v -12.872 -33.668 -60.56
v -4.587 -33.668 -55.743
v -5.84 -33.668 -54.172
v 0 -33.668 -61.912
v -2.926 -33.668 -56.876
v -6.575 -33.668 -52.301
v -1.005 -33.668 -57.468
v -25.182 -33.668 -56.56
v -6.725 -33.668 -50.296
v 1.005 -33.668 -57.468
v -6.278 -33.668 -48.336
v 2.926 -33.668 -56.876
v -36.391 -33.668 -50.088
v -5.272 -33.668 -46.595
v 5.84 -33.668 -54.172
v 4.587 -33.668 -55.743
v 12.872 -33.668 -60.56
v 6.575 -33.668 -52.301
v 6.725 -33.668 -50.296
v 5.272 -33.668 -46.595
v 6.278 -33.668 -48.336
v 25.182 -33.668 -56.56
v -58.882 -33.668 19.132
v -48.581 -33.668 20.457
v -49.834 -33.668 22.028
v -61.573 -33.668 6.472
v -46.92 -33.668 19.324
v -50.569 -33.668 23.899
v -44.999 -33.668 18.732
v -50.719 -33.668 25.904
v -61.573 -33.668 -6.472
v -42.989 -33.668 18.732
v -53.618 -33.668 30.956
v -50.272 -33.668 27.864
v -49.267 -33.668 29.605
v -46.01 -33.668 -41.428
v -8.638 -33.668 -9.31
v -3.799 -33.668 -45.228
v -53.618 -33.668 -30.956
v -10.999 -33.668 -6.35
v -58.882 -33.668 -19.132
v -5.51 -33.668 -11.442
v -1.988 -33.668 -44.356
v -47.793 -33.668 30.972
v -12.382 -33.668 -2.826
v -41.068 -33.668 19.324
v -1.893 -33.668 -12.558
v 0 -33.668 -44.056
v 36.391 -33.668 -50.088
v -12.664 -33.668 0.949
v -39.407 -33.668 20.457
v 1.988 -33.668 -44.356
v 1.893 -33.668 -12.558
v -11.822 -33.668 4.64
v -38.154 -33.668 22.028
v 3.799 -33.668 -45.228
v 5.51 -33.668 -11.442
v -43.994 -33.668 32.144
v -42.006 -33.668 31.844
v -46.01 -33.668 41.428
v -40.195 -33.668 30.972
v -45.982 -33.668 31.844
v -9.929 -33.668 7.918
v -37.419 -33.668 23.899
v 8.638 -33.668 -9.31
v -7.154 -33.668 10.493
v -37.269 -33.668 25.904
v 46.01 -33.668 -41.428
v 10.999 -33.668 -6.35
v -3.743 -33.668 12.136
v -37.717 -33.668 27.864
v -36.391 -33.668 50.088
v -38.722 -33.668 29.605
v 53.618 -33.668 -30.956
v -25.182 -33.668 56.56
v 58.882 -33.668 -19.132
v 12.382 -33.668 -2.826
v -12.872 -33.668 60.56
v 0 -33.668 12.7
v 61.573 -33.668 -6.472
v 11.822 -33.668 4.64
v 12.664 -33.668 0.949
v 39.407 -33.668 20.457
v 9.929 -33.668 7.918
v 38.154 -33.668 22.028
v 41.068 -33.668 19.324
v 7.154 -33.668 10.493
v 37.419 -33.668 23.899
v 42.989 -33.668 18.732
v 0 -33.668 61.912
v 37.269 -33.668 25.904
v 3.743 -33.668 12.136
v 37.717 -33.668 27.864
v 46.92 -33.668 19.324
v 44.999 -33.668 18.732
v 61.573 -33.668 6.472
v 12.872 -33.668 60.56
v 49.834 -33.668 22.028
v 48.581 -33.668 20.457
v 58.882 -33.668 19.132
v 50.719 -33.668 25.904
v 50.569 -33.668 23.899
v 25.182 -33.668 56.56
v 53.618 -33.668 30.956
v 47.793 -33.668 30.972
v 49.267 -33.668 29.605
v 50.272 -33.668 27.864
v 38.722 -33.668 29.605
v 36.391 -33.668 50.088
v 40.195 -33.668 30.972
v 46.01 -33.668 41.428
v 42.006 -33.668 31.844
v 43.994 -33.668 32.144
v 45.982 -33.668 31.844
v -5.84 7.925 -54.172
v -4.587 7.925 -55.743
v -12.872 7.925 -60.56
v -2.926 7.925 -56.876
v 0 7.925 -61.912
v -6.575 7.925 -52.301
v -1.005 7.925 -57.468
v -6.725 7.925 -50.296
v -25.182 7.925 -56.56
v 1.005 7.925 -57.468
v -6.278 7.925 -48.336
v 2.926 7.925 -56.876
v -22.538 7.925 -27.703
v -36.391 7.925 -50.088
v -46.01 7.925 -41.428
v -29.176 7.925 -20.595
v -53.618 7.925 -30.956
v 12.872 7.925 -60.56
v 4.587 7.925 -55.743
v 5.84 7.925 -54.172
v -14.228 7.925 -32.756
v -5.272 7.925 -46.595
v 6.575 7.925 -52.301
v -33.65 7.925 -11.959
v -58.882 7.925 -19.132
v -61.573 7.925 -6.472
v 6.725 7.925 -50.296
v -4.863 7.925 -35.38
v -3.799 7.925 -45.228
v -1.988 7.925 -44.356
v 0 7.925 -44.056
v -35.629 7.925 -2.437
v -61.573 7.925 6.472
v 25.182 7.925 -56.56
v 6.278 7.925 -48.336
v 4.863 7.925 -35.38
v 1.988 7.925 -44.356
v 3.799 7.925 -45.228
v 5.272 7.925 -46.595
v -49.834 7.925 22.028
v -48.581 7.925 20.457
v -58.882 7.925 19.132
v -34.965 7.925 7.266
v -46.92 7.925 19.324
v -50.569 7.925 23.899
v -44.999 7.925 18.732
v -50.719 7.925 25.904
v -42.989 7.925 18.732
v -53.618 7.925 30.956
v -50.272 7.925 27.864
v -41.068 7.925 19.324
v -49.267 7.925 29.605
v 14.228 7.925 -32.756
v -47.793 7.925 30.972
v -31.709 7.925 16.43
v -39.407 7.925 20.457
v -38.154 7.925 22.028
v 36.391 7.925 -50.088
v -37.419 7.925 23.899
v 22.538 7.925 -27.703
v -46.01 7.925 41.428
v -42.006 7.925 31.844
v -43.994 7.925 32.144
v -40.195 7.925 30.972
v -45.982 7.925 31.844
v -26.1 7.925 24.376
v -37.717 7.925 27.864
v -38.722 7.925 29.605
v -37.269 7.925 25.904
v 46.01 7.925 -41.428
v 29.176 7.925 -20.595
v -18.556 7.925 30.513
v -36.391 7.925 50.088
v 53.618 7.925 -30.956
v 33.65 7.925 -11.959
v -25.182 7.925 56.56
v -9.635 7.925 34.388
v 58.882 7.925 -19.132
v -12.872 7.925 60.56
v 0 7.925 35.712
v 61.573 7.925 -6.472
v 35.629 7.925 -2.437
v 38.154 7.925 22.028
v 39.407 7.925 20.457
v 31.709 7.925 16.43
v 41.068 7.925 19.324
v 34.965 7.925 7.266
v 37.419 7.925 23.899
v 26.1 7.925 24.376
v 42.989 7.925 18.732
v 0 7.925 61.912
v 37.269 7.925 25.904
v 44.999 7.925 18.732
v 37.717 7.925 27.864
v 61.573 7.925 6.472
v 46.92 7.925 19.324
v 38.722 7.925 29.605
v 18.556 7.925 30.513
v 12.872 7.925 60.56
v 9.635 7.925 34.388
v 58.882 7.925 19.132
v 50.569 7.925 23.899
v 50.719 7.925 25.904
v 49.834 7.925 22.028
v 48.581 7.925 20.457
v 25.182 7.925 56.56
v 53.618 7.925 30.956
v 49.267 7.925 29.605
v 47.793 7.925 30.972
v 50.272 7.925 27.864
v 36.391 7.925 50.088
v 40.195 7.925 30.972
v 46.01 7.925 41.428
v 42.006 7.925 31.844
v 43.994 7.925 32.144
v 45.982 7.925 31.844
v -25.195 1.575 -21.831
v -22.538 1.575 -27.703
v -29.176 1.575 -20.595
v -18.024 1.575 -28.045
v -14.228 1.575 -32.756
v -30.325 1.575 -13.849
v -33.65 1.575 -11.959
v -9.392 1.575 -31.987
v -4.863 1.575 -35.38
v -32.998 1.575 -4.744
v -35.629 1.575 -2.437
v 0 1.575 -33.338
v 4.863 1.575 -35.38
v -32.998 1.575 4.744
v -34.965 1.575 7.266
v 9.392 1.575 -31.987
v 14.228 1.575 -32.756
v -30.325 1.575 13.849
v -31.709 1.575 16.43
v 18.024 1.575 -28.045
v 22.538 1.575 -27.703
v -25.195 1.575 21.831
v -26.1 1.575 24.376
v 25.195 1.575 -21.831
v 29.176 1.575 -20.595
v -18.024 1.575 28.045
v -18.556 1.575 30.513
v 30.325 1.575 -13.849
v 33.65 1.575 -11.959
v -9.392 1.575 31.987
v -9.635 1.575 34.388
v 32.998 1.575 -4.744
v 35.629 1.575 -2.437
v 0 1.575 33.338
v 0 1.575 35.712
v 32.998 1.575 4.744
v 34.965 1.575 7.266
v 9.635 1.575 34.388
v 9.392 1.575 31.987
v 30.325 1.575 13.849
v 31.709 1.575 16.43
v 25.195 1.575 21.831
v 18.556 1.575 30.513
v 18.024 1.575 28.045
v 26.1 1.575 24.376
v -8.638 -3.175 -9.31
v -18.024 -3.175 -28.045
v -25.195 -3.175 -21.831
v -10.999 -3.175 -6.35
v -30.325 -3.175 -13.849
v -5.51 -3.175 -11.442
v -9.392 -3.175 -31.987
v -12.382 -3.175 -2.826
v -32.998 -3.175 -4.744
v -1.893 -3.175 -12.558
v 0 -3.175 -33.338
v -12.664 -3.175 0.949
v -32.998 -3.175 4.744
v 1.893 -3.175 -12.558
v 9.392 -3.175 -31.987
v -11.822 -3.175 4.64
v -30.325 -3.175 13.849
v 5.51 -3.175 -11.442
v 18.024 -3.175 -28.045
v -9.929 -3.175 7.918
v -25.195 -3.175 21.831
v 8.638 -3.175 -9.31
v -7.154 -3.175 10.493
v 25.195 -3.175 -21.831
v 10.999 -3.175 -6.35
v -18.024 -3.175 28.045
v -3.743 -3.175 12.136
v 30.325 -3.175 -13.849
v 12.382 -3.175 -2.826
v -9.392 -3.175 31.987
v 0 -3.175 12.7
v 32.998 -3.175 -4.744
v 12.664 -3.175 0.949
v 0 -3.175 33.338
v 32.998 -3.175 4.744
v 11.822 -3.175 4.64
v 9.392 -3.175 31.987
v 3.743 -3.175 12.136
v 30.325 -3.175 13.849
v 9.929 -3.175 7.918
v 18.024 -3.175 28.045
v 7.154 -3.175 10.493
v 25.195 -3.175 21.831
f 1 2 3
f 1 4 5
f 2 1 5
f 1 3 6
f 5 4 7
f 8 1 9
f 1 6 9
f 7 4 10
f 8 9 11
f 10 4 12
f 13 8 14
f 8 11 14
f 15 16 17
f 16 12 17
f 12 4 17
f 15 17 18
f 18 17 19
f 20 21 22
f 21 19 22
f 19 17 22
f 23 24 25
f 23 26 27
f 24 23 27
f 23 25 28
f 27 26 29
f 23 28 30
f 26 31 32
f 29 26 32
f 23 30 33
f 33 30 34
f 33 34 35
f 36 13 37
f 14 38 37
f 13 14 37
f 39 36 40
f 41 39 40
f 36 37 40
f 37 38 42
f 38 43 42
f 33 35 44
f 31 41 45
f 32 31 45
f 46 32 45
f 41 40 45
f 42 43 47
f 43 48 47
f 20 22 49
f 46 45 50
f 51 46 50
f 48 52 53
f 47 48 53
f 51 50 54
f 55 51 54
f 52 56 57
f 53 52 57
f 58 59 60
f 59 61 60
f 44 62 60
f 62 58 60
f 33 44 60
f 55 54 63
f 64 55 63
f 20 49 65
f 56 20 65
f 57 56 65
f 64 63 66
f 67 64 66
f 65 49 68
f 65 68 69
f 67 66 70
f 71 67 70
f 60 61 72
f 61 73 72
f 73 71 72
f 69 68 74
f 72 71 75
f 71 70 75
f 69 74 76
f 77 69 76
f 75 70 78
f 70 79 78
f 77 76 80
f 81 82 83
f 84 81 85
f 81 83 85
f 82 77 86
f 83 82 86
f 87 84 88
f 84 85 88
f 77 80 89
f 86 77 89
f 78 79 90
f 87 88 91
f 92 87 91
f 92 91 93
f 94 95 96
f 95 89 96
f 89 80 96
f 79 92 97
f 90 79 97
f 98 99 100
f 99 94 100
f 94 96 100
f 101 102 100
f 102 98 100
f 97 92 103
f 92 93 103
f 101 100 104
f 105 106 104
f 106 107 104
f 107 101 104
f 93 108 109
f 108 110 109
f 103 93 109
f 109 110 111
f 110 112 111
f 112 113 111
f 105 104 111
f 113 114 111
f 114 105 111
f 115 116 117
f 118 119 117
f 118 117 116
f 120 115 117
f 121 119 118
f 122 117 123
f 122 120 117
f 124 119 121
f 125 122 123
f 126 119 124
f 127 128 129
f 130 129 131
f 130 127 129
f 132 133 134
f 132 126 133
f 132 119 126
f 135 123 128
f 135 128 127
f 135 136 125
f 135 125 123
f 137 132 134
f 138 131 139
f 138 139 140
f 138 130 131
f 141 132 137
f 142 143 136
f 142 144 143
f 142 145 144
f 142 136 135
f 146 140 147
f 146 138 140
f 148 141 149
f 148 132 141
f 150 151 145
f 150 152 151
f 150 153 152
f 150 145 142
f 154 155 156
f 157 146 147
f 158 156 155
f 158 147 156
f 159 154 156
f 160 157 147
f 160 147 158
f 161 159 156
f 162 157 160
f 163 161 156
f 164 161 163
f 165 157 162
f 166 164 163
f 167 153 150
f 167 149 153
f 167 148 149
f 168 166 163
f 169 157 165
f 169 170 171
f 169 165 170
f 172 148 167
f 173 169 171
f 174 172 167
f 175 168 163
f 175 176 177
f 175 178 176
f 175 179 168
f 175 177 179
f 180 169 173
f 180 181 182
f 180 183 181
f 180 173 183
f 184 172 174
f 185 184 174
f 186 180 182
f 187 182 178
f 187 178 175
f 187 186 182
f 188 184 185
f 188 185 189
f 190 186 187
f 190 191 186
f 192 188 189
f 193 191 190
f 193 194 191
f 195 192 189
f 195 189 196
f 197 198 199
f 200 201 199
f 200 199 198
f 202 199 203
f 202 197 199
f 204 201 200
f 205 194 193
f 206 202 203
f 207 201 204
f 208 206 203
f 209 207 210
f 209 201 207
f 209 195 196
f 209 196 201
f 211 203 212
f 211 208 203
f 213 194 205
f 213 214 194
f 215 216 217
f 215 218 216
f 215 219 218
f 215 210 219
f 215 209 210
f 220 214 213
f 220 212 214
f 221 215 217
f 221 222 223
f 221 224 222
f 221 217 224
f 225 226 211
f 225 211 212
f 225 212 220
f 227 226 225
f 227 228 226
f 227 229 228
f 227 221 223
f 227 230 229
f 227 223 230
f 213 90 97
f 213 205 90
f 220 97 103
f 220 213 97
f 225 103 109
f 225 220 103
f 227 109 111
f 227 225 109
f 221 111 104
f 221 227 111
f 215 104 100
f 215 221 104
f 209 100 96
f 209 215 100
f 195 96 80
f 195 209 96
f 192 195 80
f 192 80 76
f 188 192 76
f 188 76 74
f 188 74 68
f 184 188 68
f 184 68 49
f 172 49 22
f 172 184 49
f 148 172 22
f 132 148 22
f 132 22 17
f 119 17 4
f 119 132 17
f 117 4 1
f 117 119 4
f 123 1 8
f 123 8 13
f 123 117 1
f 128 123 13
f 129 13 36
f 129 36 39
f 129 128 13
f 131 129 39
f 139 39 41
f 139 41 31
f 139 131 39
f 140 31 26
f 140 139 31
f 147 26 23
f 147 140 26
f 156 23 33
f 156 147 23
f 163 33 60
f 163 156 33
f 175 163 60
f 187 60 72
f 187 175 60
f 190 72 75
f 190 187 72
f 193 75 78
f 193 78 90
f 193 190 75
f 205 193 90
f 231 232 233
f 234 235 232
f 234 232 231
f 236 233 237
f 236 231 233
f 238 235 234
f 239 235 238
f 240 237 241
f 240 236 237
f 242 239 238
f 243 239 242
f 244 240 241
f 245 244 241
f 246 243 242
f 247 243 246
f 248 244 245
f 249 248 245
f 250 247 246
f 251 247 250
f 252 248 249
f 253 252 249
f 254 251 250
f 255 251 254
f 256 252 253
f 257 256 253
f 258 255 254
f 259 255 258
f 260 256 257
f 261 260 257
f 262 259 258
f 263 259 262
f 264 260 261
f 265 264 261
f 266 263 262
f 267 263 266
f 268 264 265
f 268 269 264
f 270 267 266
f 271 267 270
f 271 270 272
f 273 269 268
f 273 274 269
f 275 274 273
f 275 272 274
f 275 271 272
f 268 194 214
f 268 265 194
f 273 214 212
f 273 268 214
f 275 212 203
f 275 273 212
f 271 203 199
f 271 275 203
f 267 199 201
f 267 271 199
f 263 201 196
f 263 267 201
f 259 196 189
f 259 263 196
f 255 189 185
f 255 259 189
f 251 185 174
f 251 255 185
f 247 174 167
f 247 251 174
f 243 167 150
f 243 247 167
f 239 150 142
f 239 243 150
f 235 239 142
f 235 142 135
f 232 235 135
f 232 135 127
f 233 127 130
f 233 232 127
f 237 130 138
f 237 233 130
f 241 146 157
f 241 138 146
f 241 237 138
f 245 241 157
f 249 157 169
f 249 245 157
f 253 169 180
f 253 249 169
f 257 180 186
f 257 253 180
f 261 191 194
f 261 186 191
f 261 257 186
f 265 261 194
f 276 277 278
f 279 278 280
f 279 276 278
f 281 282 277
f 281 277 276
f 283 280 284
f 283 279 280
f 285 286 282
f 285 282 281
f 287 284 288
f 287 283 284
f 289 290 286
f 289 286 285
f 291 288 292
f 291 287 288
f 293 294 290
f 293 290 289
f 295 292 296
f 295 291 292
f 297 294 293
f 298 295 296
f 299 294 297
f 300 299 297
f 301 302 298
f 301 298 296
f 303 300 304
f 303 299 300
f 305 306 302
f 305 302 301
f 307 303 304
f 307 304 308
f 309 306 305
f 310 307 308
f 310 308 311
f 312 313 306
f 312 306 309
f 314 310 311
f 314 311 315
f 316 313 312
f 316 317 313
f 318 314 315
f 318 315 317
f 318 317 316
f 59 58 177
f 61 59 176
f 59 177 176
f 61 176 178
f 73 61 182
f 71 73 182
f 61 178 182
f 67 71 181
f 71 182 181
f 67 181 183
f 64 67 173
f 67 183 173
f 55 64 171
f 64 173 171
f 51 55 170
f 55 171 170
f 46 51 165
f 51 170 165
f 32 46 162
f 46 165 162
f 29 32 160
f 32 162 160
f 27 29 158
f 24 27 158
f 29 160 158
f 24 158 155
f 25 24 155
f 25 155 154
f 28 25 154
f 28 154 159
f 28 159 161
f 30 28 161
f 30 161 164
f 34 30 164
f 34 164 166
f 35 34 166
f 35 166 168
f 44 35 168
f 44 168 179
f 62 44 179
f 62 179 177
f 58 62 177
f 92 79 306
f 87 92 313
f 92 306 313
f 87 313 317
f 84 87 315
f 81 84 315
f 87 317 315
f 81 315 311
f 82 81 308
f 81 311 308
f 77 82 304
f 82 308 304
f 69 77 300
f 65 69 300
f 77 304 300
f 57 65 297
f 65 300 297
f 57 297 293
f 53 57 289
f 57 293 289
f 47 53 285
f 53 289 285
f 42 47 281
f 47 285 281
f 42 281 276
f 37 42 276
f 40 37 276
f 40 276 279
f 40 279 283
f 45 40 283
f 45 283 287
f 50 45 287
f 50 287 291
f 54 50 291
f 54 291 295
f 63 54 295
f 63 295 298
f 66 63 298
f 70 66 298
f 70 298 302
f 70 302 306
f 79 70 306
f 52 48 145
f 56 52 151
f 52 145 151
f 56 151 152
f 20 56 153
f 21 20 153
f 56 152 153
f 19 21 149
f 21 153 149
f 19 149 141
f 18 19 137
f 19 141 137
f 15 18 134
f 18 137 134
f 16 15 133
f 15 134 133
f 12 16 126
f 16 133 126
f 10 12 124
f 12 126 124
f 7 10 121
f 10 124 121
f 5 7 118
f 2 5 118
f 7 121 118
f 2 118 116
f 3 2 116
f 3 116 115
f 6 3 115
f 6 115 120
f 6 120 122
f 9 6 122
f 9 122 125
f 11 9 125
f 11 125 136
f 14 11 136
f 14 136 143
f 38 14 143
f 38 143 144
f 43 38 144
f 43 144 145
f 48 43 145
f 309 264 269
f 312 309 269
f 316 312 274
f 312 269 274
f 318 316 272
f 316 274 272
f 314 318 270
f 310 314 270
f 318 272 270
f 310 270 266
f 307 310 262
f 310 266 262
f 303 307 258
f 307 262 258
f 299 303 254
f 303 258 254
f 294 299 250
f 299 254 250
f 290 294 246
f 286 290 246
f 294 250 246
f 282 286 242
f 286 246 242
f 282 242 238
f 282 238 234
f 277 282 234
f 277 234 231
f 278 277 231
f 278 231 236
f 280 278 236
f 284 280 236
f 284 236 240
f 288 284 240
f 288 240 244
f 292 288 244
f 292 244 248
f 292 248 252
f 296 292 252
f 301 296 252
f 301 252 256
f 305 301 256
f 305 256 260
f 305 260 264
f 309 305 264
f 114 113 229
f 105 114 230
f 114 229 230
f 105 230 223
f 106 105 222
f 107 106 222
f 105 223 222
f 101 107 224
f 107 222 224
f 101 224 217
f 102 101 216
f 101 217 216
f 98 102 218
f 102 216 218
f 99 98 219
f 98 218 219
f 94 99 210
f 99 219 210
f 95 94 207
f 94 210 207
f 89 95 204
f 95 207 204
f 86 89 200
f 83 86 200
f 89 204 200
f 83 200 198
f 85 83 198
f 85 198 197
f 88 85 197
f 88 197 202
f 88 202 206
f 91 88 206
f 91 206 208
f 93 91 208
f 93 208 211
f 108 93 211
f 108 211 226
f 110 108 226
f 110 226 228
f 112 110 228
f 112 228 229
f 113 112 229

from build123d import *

# Parameters (mm, degrees)
SKETCH1_R               = 61.9125
BASE_EXTRUDE_DEPTH      = 7.9248
BASE_EXTRUDE_DEPTH_BACK = 33.6677
SKETCH11_R              = 33.3375
CUT_EXTRUDE1_DEPTH      = 9.525
SKETCH12_R              = 35.7124
CUT_EXTRUDE2_DEPTH      = 2.5748
CUT_EXTRUDE2_DEPTH_BACK = 4.7752
SKETCH13_R              = 12.7
CUT_EXTRUDE3_DEPTH      = 41.0177
SKETCH32_R              = 6.7437
CUT_EXTRUDE4_DEPTH      = 45.72


with BuildPart() as part:
    # Sketch1 → Base-Extrude (new body, two sides)
    with BuildSketch(Plane(origin=(0, 0, 0), x_dir=(1, 0, 0), z_dir=(0, 1, 0))) as base_extrude_sk:
        with Locations(Location((0, 0, 0), (0, 0, 270))):  # turned: the seam where the file's is
            Circle(SKETCH1_R)
    extrude(amount=BASE_EXTRUDE_DEPTH)
    extrude(base_extrude_sk.sketch, amount=-BASE_EXTRUDE_DEPTH_BACK)

    # Sketch11 → Cut-Extrude1 (cut)
    with BuildSketch(Plane(origin=(0, 6.35, 0), x_dir=(-1, 0, 0), z_dir=(0, 1, 0))):
        with Locations(Location((0, 0, 0), (0, 0, 90))):  # turned: the seam where the file's is
            Circle(SKETCH11_R)
    extrude(amount=-CUT_EXTRUDE1_DEPTH, mode=Mode.SUBTRACT)

    # Sketch12 → Cut-Extrude2 (cut, two sides)
    with BuildSketch(Plane(origin=(0, 6.35, 0), x_dir=(-1, 0, 0), z_dir=(0, 1, 0))) as cut_extrude2_sk:
        with Locations(Location((0, 0, 0), (0, 0, 90))):  # turned: the seam where the file's is
            Circle(SKETCH12_R)
    extrude(amount=CUT_EXTRUDE2_DEPTH, mode=Mode.SUBTRACT)
    extrude(cut_extrude2_sk.sketch, amount=-CUT_EXTRUDE2_DEPTH_BACK, mode=Mode.SUBTRACT)

    # Sketch13 → Cut-Extrude3 (cut, through all)
    with BuildSketch(Plane(origin=(0, 6.35, 0), x_dir=(-1, 0, 0), z_dir=(0, 1, 0))):
        with Locations(Location((0, 0, 0), (0, 0, 90))):  # turned: the seam where the file's is
            Circle(SKETCH13_R)
    extrude(amount=-CUT_EXTRUDE3_DEPTH, mode=Mode.SUBTRACT)

    # Sketch32 → Cut-Extrude4 (cut)
    with BuildSketch(Plane(origin=(0, 7.9248, 0), x_dir=(-1, 0, 0), z_dir=(0, 1, 0))):
        with Locations(Location((0, -50.8, 0), (0, 0, 90))):  # turned: the seam where the file's is
            Circle(SKETCH32_R)
        with Locations(Location((-43.994090512, 25.4, 0), (0, 0, 90))):  # turned: the seam where the file's is
            Circle(SKETCH32_R)
        with Locations(Location((43.994090512, 25.4, 0), (0, 0, 90))):  # turned: the seam where the file's is
            Circle(SKETCH32_R)
    extrude(amount=-CUT_EXTRUDE4_DEPTH, mode=Mode.SUBTRACT)


solid = part.part
